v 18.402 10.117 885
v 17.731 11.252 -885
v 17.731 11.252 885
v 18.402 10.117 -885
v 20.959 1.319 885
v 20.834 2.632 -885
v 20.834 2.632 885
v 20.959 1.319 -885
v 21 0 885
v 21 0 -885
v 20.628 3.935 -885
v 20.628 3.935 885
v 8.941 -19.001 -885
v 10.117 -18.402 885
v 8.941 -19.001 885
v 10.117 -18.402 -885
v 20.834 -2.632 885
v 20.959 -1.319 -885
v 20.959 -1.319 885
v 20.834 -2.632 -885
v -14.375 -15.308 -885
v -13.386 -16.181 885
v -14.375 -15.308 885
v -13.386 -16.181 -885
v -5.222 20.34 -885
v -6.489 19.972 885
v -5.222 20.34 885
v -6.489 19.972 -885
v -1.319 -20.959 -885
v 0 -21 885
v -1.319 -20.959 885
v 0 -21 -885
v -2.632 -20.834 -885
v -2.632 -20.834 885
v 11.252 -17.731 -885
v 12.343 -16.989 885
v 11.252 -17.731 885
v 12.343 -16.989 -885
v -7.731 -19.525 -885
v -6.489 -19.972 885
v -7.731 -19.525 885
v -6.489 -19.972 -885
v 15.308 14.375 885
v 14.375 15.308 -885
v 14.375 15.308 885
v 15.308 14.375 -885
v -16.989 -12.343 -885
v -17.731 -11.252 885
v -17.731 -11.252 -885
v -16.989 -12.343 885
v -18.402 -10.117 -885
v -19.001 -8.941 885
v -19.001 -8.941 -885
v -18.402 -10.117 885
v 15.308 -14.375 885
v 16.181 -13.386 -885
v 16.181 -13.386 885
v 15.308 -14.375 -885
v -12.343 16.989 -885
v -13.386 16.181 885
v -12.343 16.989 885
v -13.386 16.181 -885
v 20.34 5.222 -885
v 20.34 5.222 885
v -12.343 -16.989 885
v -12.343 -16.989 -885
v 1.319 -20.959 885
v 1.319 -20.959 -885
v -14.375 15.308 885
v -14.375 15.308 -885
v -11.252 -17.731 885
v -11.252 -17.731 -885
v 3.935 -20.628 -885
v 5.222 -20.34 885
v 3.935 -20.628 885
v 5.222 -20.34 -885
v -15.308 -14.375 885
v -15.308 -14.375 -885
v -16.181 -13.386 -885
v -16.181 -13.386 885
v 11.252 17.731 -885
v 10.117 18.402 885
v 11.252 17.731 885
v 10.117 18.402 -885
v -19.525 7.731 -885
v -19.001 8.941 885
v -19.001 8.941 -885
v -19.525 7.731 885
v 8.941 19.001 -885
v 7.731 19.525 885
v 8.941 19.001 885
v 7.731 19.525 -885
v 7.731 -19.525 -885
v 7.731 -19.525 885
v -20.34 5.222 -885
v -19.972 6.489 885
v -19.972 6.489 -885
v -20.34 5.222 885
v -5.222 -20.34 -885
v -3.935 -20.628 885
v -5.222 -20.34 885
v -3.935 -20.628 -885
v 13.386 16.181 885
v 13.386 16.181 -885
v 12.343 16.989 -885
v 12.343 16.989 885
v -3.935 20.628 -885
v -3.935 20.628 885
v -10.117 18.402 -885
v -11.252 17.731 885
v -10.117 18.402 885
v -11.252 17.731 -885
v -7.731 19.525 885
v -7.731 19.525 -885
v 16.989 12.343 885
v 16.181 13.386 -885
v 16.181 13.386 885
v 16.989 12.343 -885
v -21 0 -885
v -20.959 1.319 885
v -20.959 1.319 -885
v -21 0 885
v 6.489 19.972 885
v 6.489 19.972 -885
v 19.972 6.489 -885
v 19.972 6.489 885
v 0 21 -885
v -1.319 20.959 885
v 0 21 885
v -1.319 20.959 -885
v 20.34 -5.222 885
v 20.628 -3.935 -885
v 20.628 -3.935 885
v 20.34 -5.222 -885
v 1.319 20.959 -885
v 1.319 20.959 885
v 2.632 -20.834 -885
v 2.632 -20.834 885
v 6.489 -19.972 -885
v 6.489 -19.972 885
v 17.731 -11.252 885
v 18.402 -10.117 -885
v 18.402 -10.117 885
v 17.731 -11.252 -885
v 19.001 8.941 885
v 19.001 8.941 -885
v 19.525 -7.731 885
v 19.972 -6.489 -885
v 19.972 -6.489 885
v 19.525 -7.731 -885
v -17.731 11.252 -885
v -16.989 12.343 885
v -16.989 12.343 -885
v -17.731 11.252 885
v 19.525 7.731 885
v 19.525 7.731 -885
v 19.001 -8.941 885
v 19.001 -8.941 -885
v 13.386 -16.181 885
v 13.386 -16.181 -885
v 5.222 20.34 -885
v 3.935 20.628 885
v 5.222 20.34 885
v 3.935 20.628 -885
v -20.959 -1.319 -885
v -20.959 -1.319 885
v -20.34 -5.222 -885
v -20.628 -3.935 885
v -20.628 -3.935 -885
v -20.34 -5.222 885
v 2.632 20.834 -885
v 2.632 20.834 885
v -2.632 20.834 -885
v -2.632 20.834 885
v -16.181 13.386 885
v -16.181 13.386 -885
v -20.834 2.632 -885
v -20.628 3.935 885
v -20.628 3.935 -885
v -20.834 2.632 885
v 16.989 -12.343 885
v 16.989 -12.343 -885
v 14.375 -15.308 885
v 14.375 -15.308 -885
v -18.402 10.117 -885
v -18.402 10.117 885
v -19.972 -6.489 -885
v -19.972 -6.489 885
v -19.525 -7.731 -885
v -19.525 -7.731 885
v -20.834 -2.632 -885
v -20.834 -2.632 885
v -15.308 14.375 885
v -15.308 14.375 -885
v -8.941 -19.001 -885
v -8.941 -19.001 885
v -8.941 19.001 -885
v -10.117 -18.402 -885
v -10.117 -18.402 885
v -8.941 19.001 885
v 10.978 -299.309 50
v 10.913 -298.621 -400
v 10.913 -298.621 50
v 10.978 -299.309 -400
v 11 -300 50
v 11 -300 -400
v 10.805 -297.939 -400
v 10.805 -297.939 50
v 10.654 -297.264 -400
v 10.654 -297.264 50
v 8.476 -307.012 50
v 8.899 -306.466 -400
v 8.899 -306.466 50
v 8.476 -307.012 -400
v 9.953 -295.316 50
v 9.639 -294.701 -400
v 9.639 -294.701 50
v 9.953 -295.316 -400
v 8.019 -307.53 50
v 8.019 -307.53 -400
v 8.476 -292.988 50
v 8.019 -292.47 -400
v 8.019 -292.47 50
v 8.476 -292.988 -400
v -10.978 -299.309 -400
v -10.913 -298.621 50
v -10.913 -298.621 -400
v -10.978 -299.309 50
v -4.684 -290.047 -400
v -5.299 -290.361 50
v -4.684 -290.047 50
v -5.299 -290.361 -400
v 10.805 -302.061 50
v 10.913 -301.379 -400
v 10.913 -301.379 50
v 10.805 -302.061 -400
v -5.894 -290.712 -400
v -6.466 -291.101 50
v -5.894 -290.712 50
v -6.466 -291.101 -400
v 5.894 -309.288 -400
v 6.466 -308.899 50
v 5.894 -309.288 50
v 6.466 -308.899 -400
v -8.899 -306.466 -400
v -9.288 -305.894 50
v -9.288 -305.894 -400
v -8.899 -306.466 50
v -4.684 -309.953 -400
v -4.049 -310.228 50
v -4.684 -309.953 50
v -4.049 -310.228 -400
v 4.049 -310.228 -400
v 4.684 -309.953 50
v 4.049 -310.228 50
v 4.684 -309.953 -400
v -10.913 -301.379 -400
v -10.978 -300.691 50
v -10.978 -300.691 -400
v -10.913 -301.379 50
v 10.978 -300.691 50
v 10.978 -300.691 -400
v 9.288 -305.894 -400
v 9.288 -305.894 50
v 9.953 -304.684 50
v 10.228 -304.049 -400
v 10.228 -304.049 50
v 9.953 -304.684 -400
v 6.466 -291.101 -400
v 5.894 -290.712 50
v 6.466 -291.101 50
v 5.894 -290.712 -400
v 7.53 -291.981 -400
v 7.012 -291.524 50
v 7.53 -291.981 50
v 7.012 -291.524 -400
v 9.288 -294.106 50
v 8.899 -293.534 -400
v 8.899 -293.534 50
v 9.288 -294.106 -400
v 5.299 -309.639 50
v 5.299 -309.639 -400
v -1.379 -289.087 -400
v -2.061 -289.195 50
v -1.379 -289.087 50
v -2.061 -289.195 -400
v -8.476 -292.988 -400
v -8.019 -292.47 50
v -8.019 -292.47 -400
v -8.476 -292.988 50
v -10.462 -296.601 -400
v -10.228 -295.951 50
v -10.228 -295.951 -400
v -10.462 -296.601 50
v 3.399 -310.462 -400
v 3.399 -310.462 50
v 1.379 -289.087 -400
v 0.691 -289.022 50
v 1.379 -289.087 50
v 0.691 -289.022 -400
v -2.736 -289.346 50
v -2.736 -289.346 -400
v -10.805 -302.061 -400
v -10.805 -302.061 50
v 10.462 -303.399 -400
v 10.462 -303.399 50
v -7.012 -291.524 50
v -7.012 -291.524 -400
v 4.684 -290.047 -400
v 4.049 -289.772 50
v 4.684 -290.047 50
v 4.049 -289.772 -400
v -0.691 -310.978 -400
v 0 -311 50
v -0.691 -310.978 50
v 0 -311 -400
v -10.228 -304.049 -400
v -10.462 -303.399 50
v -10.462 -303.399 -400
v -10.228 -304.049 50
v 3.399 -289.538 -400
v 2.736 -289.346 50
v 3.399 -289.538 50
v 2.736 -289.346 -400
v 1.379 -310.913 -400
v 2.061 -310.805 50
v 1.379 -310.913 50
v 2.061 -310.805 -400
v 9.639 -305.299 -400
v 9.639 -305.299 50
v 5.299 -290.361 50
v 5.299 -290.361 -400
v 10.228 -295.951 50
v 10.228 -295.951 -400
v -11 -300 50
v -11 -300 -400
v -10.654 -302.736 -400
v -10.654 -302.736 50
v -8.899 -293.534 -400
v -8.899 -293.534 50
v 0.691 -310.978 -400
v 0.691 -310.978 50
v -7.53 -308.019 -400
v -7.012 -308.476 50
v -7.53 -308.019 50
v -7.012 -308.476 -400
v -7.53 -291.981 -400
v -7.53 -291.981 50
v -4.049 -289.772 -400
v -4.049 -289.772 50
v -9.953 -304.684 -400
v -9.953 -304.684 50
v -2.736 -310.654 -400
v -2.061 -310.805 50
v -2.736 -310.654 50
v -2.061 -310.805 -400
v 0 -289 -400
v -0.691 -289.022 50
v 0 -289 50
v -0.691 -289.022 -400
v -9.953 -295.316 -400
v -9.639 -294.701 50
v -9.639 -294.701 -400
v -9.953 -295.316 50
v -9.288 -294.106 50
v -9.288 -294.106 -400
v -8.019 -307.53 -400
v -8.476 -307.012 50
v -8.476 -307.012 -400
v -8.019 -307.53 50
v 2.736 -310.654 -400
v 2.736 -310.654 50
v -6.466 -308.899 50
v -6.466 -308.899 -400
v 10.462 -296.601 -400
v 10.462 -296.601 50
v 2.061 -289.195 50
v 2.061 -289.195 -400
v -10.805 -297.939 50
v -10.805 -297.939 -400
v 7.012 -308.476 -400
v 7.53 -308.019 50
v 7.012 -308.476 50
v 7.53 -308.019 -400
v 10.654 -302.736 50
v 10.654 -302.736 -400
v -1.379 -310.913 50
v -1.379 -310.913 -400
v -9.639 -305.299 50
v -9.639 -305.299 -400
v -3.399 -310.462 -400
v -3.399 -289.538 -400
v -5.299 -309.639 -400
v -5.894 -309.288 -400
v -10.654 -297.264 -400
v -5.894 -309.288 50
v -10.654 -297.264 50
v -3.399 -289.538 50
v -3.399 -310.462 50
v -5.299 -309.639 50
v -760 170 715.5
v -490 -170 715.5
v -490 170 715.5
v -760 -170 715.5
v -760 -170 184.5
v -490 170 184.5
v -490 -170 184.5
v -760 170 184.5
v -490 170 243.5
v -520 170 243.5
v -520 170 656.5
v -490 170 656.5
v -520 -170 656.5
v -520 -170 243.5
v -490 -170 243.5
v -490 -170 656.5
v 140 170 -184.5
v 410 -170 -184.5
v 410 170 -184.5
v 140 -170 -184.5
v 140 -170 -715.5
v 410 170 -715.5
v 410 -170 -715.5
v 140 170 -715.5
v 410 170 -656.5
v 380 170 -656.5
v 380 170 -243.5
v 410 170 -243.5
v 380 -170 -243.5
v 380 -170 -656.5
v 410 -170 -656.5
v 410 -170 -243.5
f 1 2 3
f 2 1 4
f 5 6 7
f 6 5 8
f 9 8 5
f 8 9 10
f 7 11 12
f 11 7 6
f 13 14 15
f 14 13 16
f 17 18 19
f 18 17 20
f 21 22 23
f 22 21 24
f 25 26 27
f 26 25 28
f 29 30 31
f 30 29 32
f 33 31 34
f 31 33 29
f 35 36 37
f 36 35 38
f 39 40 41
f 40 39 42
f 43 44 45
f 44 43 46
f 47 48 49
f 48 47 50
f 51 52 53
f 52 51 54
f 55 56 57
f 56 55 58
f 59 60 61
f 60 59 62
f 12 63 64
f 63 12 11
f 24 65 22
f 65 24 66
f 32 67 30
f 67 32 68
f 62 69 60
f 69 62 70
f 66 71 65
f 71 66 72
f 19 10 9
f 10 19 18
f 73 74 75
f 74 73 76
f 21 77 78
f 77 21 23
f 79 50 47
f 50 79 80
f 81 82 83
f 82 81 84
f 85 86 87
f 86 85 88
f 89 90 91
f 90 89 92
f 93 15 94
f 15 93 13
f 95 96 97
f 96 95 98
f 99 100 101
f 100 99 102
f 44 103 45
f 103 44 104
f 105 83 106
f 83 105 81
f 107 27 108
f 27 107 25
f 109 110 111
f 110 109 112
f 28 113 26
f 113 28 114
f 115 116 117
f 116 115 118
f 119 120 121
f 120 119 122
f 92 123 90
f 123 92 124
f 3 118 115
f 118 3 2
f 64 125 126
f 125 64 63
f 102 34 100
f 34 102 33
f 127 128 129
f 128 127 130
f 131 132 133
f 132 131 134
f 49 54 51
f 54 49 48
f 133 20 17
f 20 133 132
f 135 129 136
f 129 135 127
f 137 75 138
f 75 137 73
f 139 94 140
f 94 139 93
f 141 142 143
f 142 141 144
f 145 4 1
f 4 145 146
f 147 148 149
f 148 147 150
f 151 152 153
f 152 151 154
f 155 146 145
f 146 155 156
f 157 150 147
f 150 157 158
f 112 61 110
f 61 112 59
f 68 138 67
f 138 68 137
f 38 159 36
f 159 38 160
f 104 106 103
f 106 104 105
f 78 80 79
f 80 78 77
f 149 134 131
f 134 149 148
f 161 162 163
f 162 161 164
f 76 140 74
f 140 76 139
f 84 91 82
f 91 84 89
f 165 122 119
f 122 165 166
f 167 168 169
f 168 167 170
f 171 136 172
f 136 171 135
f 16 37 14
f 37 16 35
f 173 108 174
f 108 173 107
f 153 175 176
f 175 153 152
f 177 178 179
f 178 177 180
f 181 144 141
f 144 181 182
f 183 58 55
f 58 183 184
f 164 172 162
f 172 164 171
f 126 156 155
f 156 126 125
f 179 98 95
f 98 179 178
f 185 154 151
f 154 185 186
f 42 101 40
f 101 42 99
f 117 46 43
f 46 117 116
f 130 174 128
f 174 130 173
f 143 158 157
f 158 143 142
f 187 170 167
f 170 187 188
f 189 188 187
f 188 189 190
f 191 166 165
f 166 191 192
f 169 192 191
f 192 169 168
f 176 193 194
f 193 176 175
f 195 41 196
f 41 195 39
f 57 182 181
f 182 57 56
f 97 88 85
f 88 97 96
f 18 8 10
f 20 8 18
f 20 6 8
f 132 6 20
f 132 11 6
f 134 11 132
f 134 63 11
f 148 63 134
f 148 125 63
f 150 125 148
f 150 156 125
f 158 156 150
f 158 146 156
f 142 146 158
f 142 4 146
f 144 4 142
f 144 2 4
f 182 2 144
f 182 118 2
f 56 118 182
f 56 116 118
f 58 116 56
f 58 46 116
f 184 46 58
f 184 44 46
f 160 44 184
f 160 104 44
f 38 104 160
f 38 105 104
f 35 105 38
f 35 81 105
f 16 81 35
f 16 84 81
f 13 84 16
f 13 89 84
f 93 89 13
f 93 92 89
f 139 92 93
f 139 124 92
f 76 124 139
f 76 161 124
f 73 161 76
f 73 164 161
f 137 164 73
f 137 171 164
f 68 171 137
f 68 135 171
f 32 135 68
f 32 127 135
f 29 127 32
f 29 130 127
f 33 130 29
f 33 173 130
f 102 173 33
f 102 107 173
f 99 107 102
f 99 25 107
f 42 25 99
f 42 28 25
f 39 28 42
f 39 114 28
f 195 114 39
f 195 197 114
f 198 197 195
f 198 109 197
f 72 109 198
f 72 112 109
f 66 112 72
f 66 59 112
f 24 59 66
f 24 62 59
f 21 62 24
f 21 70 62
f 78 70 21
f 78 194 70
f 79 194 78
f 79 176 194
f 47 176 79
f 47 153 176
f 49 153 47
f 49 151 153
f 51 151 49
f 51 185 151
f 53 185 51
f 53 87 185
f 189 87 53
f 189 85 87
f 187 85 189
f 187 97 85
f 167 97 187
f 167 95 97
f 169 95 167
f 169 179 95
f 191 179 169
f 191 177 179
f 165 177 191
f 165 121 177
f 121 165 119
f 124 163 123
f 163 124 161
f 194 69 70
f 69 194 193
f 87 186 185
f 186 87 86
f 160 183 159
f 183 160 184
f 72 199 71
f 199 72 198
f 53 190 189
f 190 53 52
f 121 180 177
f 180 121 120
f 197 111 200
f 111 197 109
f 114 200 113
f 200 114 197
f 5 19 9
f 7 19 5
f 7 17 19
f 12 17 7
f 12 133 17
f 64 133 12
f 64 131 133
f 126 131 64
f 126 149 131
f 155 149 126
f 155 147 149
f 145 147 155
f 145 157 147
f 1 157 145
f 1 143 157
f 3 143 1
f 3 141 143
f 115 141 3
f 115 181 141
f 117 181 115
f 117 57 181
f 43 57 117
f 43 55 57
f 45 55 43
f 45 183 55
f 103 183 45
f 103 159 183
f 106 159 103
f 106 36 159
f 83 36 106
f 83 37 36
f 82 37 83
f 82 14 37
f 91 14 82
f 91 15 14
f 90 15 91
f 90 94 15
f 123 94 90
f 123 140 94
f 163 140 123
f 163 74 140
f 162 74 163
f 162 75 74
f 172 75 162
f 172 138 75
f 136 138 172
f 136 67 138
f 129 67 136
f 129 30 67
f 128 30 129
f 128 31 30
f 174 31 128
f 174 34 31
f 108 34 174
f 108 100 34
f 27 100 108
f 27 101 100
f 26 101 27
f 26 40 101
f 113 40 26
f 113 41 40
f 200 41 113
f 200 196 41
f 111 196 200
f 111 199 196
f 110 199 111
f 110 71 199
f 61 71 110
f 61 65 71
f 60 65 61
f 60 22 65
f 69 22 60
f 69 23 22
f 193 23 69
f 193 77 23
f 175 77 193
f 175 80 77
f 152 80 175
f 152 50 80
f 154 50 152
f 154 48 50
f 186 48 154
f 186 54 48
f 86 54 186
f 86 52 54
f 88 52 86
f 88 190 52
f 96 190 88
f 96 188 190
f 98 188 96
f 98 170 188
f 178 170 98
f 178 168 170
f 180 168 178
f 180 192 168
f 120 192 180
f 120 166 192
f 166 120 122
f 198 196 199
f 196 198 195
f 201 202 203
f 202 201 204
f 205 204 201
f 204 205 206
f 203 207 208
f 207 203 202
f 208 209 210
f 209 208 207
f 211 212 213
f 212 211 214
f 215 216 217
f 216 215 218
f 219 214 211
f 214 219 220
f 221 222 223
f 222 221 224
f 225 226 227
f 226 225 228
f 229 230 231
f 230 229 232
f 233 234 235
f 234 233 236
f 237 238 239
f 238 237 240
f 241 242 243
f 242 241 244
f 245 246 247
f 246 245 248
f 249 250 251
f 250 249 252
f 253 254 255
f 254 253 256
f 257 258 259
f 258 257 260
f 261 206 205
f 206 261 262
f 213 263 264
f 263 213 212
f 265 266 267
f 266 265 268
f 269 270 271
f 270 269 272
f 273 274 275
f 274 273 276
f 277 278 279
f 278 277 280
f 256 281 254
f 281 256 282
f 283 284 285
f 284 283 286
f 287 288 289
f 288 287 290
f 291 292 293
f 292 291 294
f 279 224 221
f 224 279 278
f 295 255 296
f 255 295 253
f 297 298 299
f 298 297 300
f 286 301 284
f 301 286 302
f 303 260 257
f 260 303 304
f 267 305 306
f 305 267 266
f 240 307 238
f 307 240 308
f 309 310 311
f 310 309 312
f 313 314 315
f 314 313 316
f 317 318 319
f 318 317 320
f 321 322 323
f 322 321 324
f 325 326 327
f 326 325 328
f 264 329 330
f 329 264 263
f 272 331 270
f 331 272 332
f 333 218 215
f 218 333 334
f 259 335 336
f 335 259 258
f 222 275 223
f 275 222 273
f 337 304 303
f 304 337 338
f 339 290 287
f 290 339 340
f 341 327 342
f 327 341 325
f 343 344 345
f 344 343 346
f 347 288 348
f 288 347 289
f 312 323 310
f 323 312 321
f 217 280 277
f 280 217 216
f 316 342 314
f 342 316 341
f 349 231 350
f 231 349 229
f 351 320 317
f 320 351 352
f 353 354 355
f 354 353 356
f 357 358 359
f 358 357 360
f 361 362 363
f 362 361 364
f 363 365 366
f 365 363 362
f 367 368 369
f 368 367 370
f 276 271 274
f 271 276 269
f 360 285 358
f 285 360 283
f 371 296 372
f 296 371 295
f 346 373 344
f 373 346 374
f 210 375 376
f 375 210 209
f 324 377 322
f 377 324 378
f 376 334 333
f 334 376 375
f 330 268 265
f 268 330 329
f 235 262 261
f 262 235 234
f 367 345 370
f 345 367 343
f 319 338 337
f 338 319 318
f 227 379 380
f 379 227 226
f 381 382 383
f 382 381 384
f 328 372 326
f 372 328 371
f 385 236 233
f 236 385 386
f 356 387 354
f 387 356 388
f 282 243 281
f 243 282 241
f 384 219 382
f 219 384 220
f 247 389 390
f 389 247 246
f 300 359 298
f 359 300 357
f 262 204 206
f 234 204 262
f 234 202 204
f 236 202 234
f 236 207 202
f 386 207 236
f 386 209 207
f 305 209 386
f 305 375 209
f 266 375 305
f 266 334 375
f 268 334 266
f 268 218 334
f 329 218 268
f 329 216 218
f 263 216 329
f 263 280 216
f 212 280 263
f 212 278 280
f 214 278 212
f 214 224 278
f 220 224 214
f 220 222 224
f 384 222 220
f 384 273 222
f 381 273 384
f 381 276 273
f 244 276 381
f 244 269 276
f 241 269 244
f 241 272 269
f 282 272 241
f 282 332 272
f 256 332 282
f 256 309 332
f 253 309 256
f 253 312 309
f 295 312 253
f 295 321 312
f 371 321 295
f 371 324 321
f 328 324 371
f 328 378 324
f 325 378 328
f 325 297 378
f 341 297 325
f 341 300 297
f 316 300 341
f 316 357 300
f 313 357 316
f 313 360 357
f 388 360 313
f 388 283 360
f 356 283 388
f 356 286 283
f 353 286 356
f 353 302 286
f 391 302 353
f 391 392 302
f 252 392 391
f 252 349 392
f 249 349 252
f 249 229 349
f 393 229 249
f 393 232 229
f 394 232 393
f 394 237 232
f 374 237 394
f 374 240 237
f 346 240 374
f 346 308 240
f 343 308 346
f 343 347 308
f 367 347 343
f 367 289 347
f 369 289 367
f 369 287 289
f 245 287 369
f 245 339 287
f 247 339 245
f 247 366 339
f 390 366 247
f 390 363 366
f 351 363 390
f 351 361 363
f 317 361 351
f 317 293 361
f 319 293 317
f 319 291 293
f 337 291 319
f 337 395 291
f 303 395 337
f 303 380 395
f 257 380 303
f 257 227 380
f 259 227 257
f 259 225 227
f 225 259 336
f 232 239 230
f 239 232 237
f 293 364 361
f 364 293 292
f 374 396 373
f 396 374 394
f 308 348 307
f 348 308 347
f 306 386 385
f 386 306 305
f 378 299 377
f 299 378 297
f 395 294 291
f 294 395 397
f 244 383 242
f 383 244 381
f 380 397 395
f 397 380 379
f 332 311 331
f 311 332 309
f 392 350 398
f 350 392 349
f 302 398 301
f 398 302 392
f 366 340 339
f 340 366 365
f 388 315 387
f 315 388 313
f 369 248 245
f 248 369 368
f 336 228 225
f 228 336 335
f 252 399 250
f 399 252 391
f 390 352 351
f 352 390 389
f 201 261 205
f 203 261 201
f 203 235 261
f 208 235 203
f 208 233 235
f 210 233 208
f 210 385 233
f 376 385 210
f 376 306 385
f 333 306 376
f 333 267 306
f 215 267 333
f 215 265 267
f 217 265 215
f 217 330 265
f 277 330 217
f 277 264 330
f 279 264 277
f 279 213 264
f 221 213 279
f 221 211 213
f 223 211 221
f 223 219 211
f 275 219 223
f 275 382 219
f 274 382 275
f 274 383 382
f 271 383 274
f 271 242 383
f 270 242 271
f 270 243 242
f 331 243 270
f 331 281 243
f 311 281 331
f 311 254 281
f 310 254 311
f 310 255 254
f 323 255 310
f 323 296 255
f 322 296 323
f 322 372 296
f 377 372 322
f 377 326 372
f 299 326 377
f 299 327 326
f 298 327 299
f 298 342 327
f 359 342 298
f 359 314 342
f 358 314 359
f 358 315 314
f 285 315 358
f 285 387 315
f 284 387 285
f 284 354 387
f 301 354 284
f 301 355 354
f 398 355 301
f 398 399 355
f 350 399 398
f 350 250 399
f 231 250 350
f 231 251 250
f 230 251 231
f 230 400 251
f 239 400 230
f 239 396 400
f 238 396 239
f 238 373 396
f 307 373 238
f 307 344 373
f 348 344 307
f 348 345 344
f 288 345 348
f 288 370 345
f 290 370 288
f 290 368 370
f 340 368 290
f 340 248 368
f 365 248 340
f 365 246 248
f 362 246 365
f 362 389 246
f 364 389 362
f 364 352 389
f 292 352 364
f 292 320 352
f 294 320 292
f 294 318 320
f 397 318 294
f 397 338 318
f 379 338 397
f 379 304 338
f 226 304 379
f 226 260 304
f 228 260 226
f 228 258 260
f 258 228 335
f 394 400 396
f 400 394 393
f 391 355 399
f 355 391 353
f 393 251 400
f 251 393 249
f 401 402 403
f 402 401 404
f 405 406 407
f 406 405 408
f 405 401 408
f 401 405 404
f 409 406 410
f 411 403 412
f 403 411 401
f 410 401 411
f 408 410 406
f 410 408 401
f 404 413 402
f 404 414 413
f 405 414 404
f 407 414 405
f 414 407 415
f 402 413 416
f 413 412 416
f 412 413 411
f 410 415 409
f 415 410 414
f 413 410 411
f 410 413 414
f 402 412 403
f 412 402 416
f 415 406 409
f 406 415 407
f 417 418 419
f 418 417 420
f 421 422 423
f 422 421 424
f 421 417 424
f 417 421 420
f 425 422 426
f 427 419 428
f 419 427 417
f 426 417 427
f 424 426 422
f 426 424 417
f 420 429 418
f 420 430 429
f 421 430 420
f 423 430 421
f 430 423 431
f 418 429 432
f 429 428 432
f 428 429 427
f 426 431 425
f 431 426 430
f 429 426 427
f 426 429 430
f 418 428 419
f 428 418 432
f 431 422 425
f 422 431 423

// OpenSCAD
// ============================================================================
// PROJECT: XXXG-00W0 WING GUNDAM ZERO EW - TORSO INNER BACKBONE INFRA
// COMPONENT VAULT: BANDAI CAST RUNNER G - FRONT SHOULDERS G5 & G6
// PACKAGING RE-ARCHITECTURE: SUB-ARMOR CAPACITOR RECESSED BANK INTEGRATION
// DESIGN STYLE: NVIDIA FOUNDERS EDITION AGGRESSIVE PLANAR GEOMETRY MATRIX
// CONFIG METRIC: SCALED TITANIUM CASTS WITH CLAVICLE SLIDERS (1:1 ACTUAL METRIC)
// ============================================================================

$fn = 100; // High-precision circular resolution segment count

// Structural Constants Scaled 1:1 for a 16.7-Meter Airframe Scale (mm)
frame_total_length = 1180;               // Total longitudinal vertical height (mm)
clavicle_track_width = 140;              // Core internal sliding track width (mm)
armor_skin_thickness = 65;              // Solid TiAl protective plating wall (mm)
harness_conduit_width = 80;             // Cast-in 4oz copper logic trace track (mm)
capacitor_pocket_depth = 15;            // Sub-armor recessed housing pocket depth (mm)
capacitor_pocket_width = 140;           // Transverse MLCC array pocket width (mm)

module Runner_G_Front_Shoulder_Forge() {
    // Central Supply Injection Runner Axis (Molten Feed Line from Siphon Forge)
    color([0.22, 0.22, 0.25]) {
        cylinder(h = frame_total_length * 1.5, d = 42, center = true);
        // Direct injection gates tracking straight into the part mold cavities
        translate() rotate() cylinder(h = 450, d = 22);
        translate([0, -300, -400]) rotate() cylinder(h = 450, d = 22);
    }
    
    // Instantiate Scaled Skeutomorphic Part Molds Symmetrically (Left & Right)
    Cast_Internal_Front_Shoulders();
}

module Cast_Internal_Front_Shoulders() {
    // ---- PART G5: INTERNAL LEFT UPPER TORSO FRONT SHOULDER FRAME ----
    translate([-450, 0, 450]) color([0.35, 0.35, 0.38]) { // Inner Frame Dark Spec
        difference() {
            // Main solid heavy-duty thoracic framework structure block segment
            cube([620, 340, frame_total_length * 0.45], center = true);
            
            // LINEAR CLAVICLE GUIDE TRACK [Milled out for sliding clavicle bars]
            cube([clavicle_track_width, 360, frame_total_length * 0.35], center = true);
            
            // SUB-ARMOR RECESSED CAPACITOR POCKETS [Segmented rows cut inside the frame walls]
            for (z_offset = [-200, 0, 200]) {
                translate([(620/2 - armor_skin_thickness + capacitor_pocket_depth/2), 0, z_offset])
                    cube([capacitor_pocket_depth, capacitor_pocket_width, 100], center = true);
            }
            
            // Continuous cast-in routing track for the 4oz solid-state wiring rails
            cube([harness_conduit_width, 360, frame_total_length], center = true);
            
            // Slicing profile tool to generate an asymmetrical half-shell part component
            translate([310, 0, 0])
                cube([620, 400, frame_total_length * 2], center = true);
        }
    }
    
    // ---- PART G6: INTERNAL RIGHT UPPER TORSO FRONT SHOULDER FRAME ----
    translate([450, 0, -450]) rotate() color([0.35, 0.35, 0.38]) {
        difference() {
            cube([620, 340, frame_total_length * 0.45], center = true);
            cube([clavicle_track_width, 360, frame_total_length * 0.35], center = true);
            
            for (z_offset = [-200, 0, 200]) {
                translate([(620/2 - armor_skin_thickness + capacitor_pocket_depth/2), 0, z_offset])
                    cube([capacitor_pocket_depth, capacitor_pocket_width, 100], center = true);
            }
            
            cube([harness_conduit_width, 360, frame_total_length], center = true);
            translate([310, 0, 0])
                cube([620, 400, frame_total_length * 2], center = true);
        }
    }
}

// Render Master Assembly to Parameter Workspace
Runner_G_Front_Shoulder_Forge();
